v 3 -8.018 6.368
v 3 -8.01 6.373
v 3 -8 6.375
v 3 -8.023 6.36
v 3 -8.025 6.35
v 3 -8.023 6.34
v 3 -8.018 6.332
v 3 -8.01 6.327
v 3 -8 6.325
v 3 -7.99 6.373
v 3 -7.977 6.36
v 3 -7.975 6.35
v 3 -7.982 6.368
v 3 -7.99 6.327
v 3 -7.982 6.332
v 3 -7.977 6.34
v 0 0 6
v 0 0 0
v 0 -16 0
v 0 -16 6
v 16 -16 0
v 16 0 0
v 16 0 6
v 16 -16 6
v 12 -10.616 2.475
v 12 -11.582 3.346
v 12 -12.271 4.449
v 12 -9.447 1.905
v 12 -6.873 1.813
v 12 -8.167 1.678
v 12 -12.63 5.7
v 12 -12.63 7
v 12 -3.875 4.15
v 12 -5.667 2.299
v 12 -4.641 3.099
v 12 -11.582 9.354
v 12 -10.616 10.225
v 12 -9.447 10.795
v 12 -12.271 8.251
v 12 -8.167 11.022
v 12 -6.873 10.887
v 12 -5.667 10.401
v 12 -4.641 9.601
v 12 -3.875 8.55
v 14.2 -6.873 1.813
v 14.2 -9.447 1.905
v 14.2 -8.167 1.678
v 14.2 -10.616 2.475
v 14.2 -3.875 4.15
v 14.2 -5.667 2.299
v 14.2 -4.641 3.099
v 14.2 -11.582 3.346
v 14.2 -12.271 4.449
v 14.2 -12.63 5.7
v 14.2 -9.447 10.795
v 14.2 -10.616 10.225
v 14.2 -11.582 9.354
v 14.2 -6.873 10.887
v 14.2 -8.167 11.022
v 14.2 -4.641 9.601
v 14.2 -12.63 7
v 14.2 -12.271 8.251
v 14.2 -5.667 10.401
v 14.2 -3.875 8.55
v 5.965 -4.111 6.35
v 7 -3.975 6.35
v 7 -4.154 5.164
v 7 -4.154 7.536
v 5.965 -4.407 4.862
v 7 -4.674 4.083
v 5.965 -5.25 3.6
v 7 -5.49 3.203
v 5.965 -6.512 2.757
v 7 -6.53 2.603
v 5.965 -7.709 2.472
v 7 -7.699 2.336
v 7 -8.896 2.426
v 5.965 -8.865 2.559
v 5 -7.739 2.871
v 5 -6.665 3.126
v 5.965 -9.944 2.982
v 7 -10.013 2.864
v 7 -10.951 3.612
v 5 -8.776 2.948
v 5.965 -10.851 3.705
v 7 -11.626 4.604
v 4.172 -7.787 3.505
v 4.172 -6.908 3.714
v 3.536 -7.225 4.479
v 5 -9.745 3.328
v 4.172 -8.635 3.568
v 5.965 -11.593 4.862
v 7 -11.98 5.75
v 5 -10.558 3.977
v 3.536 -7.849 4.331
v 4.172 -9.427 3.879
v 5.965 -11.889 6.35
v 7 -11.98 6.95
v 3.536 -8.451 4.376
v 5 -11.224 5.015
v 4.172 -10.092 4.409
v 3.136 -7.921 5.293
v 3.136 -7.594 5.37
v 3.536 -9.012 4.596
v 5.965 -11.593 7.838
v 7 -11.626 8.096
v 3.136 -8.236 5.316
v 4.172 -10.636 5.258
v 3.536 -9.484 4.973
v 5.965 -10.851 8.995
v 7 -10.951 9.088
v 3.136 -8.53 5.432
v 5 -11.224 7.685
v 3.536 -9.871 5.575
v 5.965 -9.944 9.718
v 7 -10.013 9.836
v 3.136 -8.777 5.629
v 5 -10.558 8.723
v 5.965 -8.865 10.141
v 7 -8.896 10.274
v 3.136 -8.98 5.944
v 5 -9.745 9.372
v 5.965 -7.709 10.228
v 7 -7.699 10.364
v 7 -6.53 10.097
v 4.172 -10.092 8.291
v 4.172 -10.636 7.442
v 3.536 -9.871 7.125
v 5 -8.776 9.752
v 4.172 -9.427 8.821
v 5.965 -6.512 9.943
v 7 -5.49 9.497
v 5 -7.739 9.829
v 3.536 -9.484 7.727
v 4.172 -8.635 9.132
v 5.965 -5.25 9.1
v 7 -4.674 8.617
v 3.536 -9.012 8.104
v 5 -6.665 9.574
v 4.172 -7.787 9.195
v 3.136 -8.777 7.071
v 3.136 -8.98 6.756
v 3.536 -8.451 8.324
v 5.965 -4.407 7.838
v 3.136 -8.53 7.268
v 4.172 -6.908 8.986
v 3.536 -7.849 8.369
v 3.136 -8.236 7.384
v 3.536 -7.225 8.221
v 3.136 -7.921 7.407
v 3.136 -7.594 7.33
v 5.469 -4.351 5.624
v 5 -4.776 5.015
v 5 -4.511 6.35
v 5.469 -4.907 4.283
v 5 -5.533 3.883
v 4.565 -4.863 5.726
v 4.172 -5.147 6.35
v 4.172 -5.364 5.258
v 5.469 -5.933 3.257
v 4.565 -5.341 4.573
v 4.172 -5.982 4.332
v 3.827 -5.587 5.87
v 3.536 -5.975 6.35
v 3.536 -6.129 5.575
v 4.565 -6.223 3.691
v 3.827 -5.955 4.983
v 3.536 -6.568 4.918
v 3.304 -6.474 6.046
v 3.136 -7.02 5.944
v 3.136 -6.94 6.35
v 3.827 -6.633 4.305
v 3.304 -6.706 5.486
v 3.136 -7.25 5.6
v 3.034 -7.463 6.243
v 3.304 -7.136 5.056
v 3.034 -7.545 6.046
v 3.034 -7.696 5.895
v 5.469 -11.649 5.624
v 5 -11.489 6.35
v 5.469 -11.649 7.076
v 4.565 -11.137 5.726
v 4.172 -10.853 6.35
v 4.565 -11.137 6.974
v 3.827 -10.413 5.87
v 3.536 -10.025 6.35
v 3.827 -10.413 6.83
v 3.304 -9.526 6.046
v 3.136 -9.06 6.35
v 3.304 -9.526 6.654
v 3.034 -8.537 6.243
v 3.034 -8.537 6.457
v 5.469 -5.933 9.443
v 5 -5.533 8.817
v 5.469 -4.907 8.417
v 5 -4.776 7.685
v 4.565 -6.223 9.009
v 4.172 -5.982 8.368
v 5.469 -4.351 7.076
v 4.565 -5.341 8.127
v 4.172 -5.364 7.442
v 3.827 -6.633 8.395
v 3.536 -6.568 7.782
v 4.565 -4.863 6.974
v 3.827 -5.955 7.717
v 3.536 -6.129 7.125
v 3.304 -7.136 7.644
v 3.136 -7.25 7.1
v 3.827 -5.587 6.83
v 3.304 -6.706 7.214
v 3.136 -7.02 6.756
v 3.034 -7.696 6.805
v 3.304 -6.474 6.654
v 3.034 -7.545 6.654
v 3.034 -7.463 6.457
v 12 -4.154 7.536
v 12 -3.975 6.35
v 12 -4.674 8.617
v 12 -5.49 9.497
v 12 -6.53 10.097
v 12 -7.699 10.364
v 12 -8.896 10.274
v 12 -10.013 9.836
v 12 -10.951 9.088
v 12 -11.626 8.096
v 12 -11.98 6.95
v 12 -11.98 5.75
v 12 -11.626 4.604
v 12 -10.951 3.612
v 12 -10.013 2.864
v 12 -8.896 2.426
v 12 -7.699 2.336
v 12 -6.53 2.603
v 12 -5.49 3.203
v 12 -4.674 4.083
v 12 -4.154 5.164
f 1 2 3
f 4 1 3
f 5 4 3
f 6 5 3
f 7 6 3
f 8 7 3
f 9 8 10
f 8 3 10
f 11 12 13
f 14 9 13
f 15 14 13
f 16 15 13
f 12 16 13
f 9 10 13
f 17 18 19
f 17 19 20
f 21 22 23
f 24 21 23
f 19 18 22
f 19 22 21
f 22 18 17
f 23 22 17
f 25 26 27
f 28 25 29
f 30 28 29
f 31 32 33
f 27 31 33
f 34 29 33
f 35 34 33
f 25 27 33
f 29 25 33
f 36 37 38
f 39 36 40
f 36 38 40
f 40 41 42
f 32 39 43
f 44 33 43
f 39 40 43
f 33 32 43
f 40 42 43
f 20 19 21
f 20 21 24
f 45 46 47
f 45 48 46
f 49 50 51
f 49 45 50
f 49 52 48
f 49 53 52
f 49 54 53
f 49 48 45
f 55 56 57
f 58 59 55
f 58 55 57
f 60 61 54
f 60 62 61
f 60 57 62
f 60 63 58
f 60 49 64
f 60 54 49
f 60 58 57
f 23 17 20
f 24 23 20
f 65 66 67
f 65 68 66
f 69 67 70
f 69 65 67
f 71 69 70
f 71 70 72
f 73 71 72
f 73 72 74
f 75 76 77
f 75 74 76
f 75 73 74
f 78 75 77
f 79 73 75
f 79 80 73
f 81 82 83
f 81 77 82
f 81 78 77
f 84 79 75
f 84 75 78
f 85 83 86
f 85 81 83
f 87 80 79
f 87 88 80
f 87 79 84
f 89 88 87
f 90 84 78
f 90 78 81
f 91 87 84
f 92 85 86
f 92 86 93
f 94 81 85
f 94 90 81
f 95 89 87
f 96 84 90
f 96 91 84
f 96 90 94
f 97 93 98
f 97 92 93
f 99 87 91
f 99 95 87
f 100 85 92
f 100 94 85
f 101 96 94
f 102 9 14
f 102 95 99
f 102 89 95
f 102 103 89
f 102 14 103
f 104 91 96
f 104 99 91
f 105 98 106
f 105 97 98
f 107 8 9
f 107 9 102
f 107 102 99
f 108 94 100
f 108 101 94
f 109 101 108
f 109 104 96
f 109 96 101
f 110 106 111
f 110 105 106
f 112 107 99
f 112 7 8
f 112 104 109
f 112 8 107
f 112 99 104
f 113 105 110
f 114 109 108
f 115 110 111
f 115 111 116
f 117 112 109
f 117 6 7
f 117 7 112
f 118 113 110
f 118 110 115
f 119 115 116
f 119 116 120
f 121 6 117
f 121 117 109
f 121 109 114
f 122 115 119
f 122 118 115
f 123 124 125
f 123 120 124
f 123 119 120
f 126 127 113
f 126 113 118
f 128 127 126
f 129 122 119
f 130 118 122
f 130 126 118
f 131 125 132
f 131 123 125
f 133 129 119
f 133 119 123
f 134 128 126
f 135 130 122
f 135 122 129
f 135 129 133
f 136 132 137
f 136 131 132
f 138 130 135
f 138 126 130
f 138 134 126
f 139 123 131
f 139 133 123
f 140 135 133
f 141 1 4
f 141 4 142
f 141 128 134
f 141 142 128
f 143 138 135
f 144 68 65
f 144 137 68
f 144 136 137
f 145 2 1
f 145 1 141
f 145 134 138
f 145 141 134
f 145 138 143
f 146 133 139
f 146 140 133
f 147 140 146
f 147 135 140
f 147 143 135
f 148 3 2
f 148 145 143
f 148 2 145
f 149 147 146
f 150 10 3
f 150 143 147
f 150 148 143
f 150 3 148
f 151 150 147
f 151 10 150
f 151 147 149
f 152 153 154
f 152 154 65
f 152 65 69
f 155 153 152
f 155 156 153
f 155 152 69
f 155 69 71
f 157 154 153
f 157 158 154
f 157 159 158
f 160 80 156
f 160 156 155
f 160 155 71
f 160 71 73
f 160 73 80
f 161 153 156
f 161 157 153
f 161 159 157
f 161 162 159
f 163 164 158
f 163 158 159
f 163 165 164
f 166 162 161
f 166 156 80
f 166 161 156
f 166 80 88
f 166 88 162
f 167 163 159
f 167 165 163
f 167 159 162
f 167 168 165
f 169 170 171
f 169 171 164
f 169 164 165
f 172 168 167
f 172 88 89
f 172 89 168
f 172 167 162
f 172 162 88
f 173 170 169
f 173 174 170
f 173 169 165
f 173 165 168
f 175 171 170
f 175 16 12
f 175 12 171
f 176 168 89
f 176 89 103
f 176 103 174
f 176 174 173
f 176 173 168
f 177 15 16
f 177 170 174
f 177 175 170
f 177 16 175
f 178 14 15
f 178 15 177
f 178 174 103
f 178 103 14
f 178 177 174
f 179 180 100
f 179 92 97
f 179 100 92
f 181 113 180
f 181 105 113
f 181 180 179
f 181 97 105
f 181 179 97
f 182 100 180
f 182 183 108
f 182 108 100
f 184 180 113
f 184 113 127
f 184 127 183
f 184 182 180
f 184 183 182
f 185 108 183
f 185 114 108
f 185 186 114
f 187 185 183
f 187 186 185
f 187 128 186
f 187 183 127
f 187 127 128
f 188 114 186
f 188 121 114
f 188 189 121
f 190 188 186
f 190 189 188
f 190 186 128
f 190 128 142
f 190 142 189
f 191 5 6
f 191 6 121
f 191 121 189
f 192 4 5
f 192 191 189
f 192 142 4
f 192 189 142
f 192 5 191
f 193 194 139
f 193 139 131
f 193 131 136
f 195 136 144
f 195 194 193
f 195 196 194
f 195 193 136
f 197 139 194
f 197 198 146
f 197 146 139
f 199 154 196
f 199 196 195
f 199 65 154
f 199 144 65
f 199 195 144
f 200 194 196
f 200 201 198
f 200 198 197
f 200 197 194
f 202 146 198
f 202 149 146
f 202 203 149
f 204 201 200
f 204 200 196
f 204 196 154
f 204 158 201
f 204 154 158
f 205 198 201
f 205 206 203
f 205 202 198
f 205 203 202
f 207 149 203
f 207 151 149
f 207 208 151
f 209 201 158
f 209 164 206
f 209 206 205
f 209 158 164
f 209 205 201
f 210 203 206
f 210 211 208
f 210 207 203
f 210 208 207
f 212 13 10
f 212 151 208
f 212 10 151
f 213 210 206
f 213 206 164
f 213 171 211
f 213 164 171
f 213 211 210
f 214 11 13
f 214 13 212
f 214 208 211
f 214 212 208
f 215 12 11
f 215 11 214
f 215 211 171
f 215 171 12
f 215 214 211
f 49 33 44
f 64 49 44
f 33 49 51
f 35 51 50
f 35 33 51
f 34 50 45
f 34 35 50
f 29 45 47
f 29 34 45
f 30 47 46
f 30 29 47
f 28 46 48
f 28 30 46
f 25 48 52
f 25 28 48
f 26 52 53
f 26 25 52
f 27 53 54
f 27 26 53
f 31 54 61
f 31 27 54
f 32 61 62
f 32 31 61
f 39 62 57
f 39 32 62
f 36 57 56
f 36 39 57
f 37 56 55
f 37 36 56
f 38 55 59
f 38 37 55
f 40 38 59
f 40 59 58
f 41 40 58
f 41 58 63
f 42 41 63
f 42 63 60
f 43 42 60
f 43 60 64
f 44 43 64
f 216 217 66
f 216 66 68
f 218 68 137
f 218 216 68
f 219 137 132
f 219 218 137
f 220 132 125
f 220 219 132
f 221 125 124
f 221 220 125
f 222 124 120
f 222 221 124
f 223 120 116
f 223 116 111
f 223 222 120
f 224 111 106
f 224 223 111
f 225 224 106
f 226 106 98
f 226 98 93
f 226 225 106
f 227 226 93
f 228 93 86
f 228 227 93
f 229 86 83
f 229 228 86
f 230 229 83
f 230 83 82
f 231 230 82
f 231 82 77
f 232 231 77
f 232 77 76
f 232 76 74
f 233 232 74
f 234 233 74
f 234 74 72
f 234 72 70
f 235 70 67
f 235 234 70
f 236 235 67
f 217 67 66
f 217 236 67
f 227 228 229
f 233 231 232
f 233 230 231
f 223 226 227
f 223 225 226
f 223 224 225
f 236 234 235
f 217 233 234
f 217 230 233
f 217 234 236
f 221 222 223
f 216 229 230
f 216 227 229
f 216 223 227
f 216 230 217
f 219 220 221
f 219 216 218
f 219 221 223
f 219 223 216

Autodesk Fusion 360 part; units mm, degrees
box "BoxPrimitive1" add length 16 width 16 height 6 placed x (0, -1, 0) y (1, 0, 0) z (0, 0, 1) at (0, 0, 0) makes body 1
ref_plane "WorkPlane1" through (12, -8, 3) normal (1, 0, 0) x (0, 0, 1)
sketch "Sketch7" plane through (12, -8, 3) normal (1, 0, 0) x (0, 1, 0)
  line L0 (0, 0) -> (0, 3.35)
  circle A0 centre (0, 3.35) radius 4.675
  line L1 (-4.675, 3.35) -> (4.125, 3.35)
  line L2 (4.125, 3.35) -> (4.125, 1.15)
  line L3 (4.125, 3.35) -> (4.125, 5.55)
  circle A1 centre (0, 3.35) radius 4.025
  dimension "d24" = 3.35
  dimension "d25" = 9.35
  dimension "d26" = 8.8
  dimension "d29" = 8.05
extrude "Extrude6" add sketch "Sketch7" along normal blind 2.2 separate body contours A0 L1 L3 A1 | A0 L1 L2 A1 | L1 A1 | L1 A1 makes body 2
extrude "Extrude7" add sketch "Sketch7" against normal blind 9 separate body contours L1 A1 | L1 A1 makes body 3
fillet "Fillet4" radius 4 1 edges at (3, -11.7526, 7.8055) on bodies 3
